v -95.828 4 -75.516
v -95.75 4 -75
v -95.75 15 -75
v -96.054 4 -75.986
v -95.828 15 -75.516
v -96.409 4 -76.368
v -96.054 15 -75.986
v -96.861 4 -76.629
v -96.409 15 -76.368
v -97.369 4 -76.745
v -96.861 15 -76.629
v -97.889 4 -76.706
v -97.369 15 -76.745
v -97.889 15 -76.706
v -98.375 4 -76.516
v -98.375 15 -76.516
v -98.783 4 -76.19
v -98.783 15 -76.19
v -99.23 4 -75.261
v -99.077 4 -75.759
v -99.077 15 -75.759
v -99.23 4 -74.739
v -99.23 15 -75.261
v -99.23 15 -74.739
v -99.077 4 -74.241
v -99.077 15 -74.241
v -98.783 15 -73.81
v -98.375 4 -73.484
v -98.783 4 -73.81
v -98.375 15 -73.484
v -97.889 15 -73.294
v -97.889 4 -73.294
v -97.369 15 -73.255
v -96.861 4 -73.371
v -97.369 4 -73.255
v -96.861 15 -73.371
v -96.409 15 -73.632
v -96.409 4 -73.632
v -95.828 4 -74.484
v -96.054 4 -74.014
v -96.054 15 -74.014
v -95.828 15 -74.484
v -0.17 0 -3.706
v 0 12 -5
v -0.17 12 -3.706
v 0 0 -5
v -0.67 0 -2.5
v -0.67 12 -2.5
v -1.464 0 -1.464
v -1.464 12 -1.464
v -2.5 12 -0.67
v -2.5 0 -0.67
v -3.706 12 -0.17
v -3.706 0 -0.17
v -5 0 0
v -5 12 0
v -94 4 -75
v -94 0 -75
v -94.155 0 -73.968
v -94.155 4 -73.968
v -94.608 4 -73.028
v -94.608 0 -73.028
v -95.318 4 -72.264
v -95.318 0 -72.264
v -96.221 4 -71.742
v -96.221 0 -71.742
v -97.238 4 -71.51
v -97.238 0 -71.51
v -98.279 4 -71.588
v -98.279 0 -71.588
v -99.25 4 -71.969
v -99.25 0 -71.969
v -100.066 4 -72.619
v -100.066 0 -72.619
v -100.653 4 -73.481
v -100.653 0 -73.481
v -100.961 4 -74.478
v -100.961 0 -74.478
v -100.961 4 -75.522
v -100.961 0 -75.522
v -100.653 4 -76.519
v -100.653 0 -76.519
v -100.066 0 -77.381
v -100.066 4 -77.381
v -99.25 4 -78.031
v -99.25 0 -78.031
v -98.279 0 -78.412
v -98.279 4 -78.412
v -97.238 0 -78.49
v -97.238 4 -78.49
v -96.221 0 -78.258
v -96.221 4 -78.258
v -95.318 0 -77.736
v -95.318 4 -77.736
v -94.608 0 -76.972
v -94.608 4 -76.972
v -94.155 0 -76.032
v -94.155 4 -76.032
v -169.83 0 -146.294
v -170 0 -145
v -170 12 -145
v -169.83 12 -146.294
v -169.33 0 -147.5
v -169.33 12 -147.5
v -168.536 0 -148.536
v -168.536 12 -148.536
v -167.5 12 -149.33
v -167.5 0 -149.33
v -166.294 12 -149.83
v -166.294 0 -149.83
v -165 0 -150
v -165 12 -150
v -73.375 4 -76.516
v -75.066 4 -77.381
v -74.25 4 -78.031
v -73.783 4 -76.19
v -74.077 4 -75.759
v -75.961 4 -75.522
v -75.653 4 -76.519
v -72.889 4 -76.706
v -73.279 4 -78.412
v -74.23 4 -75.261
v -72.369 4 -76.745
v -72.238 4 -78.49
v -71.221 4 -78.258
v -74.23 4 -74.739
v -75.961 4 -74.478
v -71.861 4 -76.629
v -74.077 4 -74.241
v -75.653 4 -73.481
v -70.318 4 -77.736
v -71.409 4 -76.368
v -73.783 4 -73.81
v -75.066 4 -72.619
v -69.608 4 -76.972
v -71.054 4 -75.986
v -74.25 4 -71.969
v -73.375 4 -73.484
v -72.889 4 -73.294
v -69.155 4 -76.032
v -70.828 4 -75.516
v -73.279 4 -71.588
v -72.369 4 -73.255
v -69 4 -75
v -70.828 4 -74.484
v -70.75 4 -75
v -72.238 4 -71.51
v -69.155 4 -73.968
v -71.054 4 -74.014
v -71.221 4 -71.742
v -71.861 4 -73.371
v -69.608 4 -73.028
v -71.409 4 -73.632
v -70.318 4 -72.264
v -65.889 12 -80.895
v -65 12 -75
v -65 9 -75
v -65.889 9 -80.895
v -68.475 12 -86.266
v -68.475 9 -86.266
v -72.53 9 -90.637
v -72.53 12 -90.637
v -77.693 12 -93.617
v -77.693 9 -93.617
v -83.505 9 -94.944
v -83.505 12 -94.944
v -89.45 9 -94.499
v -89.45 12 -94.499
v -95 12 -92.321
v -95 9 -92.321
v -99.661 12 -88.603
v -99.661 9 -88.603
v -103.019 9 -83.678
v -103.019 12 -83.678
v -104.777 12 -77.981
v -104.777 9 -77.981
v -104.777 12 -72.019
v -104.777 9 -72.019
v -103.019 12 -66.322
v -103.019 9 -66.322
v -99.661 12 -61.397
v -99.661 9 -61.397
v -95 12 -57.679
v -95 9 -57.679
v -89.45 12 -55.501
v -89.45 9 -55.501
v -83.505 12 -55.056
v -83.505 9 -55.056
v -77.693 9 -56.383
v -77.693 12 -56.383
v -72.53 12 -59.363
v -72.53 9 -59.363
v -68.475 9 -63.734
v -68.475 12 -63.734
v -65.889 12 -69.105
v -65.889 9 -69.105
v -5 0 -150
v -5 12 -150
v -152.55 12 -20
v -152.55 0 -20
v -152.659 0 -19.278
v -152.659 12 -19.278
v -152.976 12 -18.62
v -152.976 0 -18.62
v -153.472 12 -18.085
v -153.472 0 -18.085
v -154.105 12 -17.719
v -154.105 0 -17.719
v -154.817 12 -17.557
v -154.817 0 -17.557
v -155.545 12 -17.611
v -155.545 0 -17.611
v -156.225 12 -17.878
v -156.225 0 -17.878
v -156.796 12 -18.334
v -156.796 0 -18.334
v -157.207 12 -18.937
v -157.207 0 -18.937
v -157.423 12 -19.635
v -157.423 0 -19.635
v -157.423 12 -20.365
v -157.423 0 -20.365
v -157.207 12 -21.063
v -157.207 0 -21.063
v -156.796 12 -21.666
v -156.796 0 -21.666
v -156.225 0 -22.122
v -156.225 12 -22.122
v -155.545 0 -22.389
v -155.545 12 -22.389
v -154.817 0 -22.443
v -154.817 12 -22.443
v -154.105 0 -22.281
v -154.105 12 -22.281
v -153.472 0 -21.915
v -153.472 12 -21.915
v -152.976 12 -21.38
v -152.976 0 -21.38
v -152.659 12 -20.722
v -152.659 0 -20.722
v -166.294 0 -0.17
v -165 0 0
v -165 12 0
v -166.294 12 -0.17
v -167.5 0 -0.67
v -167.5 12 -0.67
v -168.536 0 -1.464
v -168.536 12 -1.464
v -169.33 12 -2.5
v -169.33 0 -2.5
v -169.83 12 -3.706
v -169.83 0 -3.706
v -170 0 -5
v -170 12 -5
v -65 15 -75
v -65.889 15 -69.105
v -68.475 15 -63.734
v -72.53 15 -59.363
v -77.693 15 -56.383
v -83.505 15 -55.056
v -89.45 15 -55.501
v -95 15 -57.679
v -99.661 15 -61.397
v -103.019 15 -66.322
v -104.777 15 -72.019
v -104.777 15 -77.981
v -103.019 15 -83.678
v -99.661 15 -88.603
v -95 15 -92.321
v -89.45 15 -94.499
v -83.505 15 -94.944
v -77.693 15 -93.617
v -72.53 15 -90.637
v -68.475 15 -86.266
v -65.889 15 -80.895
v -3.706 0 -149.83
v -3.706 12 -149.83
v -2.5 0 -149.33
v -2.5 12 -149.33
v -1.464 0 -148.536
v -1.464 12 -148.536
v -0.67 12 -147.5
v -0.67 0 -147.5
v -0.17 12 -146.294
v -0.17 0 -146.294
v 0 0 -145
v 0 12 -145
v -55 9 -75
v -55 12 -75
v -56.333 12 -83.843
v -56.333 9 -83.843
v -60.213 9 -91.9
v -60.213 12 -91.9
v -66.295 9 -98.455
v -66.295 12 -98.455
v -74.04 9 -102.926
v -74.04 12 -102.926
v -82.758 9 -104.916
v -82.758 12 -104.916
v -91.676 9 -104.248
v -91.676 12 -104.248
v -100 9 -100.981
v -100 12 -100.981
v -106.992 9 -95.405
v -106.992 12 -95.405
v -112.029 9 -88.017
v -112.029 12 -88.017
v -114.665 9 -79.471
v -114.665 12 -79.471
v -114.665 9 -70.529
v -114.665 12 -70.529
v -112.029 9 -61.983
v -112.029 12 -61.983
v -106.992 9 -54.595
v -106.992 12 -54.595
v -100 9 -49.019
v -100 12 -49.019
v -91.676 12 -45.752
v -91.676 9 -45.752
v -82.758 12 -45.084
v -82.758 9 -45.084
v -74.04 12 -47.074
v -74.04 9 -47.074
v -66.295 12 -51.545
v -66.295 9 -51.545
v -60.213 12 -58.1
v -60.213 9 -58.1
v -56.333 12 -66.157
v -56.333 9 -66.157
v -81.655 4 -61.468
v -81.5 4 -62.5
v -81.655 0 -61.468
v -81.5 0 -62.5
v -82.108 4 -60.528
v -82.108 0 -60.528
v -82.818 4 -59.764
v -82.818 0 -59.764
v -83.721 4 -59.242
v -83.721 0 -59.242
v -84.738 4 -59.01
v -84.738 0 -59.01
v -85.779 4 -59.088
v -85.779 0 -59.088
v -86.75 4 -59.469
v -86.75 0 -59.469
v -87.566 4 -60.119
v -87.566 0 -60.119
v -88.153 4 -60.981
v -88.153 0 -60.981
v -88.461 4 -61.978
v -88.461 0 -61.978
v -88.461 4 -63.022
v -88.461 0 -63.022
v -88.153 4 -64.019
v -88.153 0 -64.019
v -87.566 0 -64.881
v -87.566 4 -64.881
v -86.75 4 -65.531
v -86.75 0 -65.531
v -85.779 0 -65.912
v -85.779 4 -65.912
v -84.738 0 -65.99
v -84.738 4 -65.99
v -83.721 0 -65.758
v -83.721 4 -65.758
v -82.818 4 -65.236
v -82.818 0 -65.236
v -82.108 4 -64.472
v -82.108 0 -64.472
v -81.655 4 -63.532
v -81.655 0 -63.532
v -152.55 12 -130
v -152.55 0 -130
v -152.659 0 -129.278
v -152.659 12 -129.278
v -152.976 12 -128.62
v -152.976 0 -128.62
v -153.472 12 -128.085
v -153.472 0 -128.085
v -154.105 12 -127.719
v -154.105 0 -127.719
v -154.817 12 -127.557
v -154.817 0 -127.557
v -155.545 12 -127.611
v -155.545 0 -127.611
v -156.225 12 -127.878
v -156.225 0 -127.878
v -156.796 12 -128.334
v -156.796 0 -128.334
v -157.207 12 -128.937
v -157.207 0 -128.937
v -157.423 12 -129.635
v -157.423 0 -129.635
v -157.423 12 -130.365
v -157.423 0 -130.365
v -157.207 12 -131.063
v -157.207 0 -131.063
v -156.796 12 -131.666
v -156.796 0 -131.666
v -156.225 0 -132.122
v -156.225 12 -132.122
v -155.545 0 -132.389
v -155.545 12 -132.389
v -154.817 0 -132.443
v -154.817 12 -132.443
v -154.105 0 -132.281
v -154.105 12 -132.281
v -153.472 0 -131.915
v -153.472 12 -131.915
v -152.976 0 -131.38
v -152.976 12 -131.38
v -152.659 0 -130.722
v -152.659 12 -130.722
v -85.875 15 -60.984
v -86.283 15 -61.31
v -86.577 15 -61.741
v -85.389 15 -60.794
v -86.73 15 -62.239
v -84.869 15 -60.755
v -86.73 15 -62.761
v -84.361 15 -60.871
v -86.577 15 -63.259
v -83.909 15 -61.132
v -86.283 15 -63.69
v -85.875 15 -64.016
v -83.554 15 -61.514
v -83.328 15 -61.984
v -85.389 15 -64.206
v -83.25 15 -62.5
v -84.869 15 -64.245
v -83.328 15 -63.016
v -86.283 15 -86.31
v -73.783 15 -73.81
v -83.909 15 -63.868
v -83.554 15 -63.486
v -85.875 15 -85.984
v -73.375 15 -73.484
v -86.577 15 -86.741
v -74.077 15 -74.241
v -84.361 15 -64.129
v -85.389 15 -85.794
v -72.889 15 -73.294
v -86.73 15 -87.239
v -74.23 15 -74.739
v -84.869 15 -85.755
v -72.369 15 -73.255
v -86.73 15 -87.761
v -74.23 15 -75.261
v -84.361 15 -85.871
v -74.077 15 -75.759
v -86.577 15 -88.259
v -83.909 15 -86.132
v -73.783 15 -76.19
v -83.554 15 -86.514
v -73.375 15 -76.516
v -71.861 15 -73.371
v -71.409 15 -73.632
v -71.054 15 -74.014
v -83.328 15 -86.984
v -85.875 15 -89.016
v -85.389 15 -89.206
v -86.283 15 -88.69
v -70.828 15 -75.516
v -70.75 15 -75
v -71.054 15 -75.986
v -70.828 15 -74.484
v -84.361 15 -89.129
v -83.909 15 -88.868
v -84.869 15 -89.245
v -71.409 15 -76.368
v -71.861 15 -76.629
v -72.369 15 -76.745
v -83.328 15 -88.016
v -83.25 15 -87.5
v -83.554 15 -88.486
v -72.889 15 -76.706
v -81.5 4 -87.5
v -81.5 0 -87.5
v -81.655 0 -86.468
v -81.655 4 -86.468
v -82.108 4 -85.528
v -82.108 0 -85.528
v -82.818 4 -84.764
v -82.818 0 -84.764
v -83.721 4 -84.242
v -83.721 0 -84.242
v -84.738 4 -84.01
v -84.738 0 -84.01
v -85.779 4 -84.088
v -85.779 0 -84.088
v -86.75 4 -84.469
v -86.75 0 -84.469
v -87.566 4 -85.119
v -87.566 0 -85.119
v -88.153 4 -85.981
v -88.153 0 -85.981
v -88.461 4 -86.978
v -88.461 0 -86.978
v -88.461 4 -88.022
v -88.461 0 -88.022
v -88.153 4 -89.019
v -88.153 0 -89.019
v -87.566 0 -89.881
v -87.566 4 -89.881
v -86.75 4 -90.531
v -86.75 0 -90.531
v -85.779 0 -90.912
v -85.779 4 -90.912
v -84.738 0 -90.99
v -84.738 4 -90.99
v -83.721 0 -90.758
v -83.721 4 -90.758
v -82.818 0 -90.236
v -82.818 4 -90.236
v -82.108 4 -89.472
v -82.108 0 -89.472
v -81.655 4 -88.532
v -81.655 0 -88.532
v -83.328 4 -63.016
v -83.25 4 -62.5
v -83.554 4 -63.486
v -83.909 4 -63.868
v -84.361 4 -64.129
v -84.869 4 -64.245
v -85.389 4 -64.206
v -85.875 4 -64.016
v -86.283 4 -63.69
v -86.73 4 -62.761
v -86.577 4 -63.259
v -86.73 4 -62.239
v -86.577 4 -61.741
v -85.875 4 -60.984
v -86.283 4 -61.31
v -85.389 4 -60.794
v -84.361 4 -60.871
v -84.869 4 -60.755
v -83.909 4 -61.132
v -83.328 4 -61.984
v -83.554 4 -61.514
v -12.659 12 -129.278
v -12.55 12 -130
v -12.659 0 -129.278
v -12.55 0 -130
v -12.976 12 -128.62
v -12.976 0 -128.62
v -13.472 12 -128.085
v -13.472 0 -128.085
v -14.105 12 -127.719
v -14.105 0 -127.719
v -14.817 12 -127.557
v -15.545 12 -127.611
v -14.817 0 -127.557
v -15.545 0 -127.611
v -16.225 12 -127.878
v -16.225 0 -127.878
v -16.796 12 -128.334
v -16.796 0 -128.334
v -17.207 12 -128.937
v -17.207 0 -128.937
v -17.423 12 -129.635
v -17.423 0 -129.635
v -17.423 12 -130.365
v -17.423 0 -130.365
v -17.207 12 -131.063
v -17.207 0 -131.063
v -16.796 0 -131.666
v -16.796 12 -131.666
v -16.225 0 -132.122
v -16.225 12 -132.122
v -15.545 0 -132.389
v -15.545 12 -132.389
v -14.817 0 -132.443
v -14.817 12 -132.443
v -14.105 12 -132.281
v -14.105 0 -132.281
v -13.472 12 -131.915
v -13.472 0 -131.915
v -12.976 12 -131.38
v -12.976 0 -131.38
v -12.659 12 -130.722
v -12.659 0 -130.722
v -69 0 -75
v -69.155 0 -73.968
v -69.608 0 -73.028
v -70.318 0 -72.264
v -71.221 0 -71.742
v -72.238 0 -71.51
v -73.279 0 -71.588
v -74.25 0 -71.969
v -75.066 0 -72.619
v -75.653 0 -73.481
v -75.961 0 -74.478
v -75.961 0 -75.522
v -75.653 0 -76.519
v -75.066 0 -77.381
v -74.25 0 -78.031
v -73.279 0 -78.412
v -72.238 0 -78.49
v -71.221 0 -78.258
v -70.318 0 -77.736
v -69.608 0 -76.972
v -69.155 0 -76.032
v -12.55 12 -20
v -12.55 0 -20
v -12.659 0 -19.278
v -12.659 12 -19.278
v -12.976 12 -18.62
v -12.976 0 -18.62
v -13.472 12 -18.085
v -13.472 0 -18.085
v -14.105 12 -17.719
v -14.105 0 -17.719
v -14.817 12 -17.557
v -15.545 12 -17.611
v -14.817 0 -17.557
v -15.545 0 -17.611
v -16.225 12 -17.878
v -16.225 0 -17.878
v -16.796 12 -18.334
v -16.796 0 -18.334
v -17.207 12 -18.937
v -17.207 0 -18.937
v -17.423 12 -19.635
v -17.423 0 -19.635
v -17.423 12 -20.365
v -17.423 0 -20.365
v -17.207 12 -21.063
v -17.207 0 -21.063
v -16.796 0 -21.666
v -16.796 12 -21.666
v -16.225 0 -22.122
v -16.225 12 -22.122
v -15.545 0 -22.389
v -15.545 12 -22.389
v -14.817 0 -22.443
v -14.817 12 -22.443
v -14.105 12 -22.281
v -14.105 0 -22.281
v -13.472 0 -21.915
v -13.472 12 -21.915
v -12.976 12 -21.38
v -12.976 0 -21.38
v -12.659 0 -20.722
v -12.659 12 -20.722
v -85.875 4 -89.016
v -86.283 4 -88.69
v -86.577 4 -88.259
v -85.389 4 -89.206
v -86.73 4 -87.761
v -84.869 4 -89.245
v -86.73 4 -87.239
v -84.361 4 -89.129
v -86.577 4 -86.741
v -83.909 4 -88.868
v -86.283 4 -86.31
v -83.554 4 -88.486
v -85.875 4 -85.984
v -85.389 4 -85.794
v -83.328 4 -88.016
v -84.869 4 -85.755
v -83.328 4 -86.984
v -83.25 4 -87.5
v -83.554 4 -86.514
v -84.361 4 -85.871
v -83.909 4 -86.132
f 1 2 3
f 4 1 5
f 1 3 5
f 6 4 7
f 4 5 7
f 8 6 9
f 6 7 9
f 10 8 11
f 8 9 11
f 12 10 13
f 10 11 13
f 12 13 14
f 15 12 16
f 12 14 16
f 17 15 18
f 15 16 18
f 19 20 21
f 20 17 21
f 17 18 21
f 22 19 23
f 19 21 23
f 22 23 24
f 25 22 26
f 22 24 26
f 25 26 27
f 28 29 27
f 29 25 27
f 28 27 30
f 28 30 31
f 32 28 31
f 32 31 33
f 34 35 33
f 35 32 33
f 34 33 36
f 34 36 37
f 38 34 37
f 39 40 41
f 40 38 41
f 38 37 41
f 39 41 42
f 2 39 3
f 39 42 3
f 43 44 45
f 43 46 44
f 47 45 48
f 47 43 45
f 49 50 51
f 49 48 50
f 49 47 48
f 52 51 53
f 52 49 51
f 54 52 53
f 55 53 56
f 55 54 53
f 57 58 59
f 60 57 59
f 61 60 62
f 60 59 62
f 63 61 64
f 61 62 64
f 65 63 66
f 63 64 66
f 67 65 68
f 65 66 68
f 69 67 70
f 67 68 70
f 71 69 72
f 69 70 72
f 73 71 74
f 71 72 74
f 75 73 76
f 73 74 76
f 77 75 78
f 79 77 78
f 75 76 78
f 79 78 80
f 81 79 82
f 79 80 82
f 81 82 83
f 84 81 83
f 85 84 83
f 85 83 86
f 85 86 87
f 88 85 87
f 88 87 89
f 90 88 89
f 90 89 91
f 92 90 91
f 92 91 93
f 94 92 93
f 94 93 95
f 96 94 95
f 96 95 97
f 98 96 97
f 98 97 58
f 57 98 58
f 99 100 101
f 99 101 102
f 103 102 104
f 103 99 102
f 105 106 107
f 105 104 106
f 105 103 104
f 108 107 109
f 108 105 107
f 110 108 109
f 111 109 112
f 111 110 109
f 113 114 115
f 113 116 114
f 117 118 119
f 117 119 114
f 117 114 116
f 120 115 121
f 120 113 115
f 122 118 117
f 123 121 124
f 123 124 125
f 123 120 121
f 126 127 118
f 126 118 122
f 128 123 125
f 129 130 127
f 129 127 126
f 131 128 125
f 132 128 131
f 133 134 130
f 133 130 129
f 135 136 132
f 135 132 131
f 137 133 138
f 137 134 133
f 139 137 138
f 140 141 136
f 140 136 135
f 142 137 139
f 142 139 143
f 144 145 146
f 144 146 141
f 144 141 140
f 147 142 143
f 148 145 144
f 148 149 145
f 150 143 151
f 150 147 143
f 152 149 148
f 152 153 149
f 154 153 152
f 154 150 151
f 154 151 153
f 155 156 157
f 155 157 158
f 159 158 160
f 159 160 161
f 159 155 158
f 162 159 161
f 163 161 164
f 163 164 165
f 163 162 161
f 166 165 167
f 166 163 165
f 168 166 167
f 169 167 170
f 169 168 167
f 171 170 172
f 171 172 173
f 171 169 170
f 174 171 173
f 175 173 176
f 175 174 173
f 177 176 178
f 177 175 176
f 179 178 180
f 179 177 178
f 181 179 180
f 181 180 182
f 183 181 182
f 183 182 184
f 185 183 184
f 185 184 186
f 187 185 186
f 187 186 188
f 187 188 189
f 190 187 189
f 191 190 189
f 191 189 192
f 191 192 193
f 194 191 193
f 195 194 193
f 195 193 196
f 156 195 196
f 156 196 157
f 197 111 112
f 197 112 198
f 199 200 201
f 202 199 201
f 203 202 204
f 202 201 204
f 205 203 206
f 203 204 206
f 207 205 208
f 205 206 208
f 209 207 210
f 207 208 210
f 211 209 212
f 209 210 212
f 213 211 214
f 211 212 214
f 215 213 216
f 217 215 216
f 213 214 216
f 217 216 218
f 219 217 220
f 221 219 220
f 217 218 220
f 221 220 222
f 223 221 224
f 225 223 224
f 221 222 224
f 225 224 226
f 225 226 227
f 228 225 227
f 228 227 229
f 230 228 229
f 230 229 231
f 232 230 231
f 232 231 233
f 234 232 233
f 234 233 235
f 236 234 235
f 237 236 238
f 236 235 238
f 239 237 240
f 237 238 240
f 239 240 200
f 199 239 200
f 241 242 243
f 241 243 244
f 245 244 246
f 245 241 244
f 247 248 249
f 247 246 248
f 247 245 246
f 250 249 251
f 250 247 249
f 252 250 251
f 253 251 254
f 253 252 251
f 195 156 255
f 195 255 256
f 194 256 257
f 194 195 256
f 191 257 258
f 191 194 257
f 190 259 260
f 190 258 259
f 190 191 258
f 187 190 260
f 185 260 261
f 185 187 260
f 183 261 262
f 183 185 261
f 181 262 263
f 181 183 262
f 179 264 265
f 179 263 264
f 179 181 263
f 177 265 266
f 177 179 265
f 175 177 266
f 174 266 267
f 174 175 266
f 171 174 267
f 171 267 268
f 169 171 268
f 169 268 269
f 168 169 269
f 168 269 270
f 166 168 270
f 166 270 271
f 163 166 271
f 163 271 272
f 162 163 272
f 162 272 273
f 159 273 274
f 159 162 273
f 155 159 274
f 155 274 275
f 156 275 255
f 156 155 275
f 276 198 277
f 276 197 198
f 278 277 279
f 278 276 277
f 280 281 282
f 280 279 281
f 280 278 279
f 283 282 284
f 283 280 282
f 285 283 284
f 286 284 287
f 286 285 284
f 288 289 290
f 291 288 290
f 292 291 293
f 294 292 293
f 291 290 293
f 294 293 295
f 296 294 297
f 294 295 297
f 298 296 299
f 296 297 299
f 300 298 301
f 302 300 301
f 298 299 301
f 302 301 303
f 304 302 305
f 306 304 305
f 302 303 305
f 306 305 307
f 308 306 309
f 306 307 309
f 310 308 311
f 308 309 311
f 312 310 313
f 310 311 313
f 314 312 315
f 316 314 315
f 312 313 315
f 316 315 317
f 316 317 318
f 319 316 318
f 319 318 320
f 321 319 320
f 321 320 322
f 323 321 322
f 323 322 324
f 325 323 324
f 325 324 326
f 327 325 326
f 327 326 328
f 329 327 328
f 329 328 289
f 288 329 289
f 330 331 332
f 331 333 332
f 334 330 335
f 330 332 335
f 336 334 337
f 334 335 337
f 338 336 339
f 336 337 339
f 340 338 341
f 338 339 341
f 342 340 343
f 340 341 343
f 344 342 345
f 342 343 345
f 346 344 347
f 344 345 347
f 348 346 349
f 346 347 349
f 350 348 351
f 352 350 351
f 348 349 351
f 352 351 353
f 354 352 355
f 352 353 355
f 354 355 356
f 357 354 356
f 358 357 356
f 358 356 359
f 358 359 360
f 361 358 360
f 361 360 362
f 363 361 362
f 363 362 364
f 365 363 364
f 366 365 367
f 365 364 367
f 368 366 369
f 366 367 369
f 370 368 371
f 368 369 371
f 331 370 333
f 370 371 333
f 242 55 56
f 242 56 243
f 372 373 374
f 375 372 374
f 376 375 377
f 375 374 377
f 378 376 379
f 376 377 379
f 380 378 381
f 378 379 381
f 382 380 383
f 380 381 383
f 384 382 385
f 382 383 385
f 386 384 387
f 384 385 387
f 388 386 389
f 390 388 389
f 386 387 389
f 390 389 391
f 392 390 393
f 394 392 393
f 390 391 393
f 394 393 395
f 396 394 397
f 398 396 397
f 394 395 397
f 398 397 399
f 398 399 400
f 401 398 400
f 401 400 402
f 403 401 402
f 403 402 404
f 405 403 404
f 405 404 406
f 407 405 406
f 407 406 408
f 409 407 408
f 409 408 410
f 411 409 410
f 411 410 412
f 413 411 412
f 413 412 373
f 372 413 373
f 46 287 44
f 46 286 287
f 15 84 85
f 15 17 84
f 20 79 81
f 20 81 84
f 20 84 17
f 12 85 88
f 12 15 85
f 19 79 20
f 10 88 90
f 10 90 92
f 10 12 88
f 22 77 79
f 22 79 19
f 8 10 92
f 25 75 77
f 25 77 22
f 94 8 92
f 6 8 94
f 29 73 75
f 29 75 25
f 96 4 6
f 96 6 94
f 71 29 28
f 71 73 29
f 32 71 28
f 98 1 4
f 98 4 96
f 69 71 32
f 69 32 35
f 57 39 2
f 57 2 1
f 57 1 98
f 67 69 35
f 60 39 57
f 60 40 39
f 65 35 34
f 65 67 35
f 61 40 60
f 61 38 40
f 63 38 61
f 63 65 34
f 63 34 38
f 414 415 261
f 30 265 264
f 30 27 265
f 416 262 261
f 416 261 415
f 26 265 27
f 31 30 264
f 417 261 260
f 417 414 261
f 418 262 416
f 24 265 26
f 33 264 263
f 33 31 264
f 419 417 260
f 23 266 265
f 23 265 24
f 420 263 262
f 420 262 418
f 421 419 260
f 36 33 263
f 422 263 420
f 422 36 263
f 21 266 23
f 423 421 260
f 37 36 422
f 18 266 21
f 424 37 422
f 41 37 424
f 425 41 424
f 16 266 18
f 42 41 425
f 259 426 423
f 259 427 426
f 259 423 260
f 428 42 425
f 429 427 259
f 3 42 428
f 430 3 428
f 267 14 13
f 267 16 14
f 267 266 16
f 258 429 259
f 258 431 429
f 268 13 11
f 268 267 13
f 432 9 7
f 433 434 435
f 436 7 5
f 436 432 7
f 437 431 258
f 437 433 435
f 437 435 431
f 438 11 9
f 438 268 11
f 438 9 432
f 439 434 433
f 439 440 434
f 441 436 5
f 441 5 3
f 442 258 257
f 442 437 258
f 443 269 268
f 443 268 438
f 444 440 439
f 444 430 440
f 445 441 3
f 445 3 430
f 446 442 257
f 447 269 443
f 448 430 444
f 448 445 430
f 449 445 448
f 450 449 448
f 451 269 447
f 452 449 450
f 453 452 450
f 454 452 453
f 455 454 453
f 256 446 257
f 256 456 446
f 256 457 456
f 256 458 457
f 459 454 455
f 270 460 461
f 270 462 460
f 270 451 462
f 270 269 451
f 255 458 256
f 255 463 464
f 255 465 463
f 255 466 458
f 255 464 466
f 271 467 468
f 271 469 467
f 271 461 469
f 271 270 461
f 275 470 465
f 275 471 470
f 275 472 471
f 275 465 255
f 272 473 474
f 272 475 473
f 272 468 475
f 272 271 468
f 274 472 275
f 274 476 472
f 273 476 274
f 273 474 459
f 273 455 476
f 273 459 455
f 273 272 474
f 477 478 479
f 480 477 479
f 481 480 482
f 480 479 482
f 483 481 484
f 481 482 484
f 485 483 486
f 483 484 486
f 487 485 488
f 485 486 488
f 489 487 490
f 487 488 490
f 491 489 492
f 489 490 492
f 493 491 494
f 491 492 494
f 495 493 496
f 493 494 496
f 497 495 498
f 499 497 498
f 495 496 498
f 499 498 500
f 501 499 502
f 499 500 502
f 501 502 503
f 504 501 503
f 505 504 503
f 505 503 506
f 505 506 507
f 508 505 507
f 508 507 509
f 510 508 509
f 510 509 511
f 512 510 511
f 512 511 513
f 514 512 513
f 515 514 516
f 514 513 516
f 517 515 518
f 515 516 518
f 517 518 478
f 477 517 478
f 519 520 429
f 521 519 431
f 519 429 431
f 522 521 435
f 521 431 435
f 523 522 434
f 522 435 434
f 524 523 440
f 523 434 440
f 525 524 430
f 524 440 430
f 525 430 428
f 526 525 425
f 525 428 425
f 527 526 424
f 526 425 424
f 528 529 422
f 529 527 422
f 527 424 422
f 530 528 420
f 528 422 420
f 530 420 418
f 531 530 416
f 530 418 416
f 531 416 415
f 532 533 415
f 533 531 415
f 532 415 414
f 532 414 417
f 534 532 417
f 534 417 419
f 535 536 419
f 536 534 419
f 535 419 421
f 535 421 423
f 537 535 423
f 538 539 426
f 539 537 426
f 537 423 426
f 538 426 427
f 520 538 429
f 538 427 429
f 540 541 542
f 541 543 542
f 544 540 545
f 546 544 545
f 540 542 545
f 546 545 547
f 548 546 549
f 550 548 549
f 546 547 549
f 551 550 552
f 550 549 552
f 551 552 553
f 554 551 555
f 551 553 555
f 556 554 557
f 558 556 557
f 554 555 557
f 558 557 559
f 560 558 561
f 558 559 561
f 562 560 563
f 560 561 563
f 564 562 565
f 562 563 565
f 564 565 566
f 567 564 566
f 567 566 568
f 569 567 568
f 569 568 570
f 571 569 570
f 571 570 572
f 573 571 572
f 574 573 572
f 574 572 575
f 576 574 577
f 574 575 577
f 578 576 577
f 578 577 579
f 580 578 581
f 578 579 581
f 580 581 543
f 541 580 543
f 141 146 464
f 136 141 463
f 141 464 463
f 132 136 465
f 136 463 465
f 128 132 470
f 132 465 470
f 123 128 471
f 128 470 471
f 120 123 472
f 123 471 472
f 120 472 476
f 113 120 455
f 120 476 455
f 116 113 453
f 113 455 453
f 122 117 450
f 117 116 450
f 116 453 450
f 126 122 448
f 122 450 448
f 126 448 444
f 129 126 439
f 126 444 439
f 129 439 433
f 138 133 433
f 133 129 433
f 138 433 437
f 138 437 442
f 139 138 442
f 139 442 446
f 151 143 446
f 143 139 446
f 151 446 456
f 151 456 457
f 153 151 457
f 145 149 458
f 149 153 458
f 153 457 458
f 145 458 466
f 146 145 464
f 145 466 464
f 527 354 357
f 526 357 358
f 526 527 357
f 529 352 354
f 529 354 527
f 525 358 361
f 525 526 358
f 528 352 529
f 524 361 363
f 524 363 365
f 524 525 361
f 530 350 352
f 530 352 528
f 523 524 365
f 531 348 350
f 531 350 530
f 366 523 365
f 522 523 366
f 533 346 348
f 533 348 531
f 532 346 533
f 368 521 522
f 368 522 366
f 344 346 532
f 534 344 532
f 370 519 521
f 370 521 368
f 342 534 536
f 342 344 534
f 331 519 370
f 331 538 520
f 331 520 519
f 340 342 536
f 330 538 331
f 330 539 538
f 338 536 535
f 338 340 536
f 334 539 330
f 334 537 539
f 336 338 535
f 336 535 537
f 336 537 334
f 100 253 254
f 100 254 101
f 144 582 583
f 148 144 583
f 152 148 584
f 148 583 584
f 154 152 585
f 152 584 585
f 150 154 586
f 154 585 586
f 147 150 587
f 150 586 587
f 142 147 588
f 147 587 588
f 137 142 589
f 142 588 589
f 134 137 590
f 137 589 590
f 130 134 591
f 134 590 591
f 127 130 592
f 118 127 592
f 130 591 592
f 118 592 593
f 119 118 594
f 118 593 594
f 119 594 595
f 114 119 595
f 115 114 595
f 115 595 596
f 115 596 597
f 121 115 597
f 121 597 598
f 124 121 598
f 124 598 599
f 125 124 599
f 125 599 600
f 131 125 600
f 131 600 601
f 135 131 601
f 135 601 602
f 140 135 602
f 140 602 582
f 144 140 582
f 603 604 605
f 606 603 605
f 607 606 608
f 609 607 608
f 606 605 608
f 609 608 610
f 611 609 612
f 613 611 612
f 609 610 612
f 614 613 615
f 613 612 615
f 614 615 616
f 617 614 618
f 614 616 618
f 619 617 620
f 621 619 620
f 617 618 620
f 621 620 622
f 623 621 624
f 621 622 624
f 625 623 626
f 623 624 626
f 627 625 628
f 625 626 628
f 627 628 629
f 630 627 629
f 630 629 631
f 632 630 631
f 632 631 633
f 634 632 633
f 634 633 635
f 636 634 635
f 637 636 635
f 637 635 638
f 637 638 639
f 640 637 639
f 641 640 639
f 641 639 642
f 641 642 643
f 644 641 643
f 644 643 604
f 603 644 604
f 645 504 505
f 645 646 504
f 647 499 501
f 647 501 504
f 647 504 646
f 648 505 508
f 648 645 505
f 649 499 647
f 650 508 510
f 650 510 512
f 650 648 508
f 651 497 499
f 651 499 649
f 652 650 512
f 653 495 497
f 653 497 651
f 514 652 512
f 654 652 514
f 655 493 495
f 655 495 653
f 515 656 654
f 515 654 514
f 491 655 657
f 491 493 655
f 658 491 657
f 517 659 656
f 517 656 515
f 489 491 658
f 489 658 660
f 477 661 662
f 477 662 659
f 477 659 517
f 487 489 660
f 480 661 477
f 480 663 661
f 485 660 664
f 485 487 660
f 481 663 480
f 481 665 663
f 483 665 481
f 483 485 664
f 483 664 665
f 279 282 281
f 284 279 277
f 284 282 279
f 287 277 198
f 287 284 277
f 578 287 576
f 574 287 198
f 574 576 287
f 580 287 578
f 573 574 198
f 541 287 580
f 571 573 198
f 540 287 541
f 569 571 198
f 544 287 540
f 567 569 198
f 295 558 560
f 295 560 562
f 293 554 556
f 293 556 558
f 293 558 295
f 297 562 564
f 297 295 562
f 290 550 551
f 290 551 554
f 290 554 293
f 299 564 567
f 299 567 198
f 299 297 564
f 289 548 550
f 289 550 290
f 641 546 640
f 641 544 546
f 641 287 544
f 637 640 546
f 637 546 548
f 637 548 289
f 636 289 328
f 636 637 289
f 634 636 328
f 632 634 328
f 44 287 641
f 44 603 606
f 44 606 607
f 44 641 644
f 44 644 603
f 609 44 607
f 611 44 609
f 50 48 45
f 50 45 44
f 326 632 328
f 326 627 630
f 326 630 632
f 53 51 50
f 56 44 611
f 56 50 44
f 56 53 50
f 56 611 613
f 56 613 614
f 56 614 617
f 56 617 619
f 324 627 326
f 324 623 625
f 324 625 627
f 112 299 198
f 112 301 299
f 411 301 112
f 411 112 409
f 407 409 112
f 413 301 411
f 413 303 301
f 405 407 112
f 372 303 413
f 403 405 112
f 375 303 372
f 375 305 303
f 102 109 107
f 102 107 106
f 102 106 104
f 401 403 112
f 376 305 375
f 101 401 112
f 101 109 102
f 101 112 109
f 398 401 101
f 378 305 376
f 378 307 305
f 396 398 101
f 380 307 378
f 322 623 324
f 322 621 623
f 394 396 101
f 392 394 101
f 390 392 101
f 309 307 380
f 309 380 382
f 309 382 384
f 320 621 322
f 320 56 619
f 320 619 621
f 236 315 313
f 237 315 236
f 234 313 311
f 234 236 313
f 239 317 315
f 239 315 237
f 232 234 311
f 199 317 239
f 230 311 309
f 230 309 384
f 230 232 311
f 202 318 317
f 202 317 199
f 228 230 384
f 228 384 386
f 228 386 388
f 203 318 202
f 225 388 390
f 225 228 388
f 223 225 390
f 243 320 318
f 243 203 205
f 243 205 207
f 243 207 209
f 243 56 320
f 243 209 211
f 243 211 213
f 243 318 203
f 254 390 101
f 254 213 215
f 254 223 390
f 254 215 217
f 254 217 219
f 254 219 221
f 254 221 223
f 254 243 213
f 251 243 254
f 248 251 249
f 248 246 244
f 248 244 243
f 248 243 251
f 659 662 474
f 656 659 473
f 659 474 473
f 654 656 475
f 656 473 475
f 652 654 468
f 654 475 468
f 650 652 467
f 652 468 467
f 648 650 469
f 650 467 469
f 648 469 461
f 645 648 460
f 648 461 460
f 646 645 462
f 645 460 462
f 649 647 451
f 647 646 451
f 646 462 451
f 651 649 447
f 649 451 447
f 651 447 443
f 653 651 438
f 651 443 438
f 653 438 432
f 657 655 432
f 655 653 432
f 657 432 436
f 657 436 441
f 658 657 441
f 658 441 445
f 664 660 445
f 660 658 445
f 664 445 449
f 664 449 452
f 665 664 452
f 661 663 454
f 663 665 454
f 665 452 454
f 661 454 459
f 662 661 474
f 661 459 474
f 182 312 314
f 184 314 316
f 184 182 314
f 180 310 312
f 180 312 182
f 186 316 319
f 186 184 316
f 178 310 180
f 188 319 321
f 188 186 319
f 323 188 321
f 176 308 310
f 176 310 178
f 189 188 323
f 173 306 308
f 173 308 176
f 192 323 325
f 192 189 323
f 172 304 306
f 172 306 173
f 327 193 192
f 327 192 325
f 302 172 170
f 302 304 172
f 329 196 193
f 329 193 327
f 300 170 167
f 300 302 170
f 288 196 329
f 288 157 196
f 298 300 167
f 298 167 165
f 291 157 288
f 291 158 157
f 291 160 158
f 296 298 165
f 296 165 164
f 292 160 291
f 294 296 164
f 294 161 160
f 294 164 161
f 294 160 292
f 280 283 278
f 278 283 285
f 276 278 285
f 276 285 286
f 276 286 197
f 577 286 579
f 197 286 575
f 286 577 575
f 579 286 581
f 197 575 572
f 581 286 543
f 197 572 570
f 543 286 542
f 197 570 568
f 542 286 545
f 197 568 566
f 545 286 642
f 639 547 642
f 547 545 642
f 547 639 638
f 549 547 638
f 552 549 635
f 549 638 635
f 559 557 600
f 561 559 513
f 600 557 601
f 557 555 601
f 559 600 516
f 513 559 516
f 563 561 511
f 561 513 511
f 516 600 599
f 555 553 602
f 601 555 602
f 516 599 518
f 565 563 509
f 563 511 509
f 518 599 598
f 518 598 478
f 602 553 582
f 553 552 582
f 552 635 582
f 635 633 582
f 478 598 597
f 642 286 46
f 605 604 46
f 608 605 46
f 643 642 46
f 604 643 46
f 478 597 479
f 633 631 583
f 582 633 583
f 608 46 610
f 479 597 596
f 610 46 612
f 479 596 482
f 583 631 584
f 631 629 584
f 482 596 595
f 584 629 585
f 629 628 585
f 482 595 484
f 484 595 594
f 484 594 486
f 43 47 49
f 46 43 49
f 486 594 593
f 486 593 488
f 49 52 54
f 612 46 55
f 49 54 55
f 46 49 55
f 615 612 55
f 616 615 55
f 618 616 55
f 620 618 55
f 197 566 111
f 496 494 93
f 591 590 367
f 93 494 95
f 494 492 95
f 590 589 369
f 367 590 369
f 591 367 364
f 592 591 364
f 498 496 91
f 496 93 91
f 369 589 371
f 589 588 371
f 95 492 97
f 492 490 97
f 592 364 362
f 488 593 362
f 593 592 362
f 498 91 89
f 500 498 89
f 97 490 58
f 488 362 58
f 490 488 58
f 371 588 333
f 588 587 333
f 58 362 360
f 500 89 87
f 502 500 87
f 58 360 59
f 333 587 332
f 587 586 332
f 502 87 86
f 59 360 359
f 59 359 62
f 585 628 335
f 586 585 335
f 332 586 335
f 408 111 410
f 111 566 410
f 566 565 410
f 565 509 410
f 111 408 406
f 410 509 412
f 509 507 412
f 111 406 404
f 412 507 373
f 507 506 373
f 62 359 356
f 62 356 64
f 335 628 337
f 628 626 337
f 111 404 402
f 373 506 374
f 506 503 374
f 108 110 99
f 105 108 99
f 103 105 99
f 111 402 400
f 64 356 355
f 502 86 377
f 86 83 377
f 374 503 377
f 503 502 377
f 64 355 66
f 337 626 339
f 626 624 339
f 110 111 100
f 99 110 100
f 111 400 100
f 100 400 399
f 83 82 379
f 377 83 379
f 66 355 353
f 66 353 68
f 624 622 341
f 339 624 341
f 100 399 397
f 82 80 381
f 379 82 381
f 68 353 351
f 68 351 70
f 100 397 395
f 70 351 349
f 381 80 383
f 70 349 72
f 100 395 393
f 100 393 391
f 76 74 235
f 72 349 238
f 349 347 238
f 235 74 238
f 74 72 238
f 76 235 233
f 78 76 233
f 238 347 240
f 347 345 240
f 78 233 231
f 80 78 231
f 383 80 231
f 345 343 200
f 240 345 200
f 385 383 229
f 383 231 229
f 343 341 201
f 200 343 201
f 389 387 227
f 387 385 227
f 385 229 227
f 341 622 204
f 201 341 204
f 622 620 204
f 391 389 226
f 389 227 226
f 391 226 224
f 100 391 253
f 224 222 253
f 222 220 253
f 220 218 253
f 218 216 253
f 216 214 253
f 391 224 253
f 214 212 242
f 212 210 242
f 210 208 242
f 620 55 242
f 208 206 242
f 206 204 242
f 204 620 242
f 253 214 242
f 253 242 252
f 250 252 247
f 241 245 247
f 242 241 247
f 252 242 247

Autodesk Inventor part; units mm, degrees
ref_plane "YZ Plane" through (0, 0, 0) normal (1, 0, 0) x (0, 1, 0)
ref_plane "XZ Plane" through (0, 0, 0) normal (0, 1, 0) x (-1, 0, 0)
ref_plane "XY Plane" through (0, 0, 0) normal (0, 0, 1) x (1, 0, 0)
sketch "Sketch1" plane through (0, 0, 0) normal (0, 1, 0) x (-1, 0, 0)
  line L0 (5, 0) -> (165, 0)
  line L1 (170, -5) -> (170, -145)
  line L2 (165, -150) -> (5, -150)
  line L3 (0, -145) -> (0, -5)
  arc A0 (170, -5) -> (165, 0) centre (165, -5) ccw
  arc A1 (165, -150) -> (170, -145) centre (165, -145) ccw
  arc A2 (5, 0) -> (0, -5) centre (5, -5) ccw
  arc A3 (0, -145) -> (5, -150) centre (5, -145) ccw
  point P0 (0, 0)
  point P1 (170, -150)
  point P2 (170, 0)
  point P3 (0, -150)
  dimension "d0" = 170
  dimension "d1" = 150
  dimension "d2" = 5
extrude "Extrusion1" add sketch "Sketch1" along normal blind 12
sketch "Sketch2" plane through (0, 12, 0) normal (0, 1, 0) x (1, 0, 0)
  line L0 (0, 5) -> (0, 145) projected
  line L1 (-170, 145) -> (-170, 5) projected
  line L2 (-165, 0) -> (-5, 0) projected
  circle A0 centre (-85, 75) radius 20
  circle A1 centre (-85, 75) radius 30
  point P0 (0, 0)
  dimension "d5" = 40
  dimension "d6" = 60
extrude "Extrusion2" cut sketch "Sketch2" against normal blind 3
sketch "Sketch3" plane through (-85, 12, -75) normal (0, 1, 0) x (1, 0, 0)
  circle A0 centre (0, 0) radius 30 projected
  circle A1 centre (0, 0) radius 20
  point P0 (85, -75)
extrude "Extrusion3" add sketch "Sketch3" along normal blind 3 contours A1
sketch "Sketch4" plane through (-85, 15, -75) normal (0, 1, 0) x (1, 0, 0)
  circle A0 centre (-12.5, 0) radius 1.75
  circle A1 centre (0, 12.5) radius 1.75
  circle A2 centre (0, -12.5) radius 1.75
  circle A3 centre (12.5, 0) radius 1.75
  point P0 (85, -75)
  dimension "d15" = 3.5
  dimension "d16" = 3.5
  dimension "d17" = 3.5
  dimension "d18" = 3.5
extrude "Extrusion4" cut sketch "Sketch4" against normal blind 20
sketch "Sketch5" plane through (0, 0, 0) normal (0, -1, 0) x (1, 0, 0)
  circle A0 centre (-85, -87.5) radius 1.75 projected
  circle A1 centre (-85, -87.5) radius 3.5
  circle A2 centre (-72.5, -75) radius 1.75 projected
  circle A3 centre (-72.5, -75) radius 3.5
  circle A4 centre (-85, -62.5) radius 1.75 projected
  circle A5 centre (-85, -62.5) radius 3.5
  circle A6 centre (-97.5, -75) radius 1.75 projected
  circle A7 centre (-97.5, -75) radius 3.5
  point P0 (0, 0)
  dimension "d21" = 7
  dimension "d22" = 7
  dimension "d23" = 7
  dimension "d24" = 7
extrude "Extrusion5" cut sketch "Sketch5" against normal blind 4
sketch "Sketch6" plane through (0, 0, 0) normal (0, -1, 0) x (1, 0, 0)
  line L0 (0, 0) -> (0, -20)
  line L1 (0, -5) -> (0, -145) projected
  line L2 (0, -20) -> (-15, -20)
  line L3 (0, -150) -> (0, -130)
  line L4 (0, -130) -> (-15, -130)
  line L5 (-170, 0) -> (-170, -20)
  line L6 (-170, -145) -> (-170, -5) projected
  line L7 (-170, -20) -> (-155, -20)
  line L8 (-170, -150) -> (-170, -130)
  line L9 (-170, -130) -> (-155, -130)
  circle A0 centre (-15, -20) radius 2.45
  circle A1 centre (-15, -130) radius 2.45
  circle A2 centre (-155, -20) radius 2.45
  circle A3 centre (-155, -130) radius 2.45
  dimension "d27" = 20
  dimension "d28" = 15
  dimension "d29" = 20
  dimension "d30" = 15
  dimension "d31" = 20
  dimension "d32" = 15
  dimension "d33" = 20
  dimension "d34" = 15
  dimension "d35" = 4.9
  dimension "d36" = 4.9
  dimension "d37" = 4.9
  dimension "d38" = 4.9
extrude "Extrusion6" cut sketch "Sketch6" against normal blind 15
properties part number "b_base_table"
